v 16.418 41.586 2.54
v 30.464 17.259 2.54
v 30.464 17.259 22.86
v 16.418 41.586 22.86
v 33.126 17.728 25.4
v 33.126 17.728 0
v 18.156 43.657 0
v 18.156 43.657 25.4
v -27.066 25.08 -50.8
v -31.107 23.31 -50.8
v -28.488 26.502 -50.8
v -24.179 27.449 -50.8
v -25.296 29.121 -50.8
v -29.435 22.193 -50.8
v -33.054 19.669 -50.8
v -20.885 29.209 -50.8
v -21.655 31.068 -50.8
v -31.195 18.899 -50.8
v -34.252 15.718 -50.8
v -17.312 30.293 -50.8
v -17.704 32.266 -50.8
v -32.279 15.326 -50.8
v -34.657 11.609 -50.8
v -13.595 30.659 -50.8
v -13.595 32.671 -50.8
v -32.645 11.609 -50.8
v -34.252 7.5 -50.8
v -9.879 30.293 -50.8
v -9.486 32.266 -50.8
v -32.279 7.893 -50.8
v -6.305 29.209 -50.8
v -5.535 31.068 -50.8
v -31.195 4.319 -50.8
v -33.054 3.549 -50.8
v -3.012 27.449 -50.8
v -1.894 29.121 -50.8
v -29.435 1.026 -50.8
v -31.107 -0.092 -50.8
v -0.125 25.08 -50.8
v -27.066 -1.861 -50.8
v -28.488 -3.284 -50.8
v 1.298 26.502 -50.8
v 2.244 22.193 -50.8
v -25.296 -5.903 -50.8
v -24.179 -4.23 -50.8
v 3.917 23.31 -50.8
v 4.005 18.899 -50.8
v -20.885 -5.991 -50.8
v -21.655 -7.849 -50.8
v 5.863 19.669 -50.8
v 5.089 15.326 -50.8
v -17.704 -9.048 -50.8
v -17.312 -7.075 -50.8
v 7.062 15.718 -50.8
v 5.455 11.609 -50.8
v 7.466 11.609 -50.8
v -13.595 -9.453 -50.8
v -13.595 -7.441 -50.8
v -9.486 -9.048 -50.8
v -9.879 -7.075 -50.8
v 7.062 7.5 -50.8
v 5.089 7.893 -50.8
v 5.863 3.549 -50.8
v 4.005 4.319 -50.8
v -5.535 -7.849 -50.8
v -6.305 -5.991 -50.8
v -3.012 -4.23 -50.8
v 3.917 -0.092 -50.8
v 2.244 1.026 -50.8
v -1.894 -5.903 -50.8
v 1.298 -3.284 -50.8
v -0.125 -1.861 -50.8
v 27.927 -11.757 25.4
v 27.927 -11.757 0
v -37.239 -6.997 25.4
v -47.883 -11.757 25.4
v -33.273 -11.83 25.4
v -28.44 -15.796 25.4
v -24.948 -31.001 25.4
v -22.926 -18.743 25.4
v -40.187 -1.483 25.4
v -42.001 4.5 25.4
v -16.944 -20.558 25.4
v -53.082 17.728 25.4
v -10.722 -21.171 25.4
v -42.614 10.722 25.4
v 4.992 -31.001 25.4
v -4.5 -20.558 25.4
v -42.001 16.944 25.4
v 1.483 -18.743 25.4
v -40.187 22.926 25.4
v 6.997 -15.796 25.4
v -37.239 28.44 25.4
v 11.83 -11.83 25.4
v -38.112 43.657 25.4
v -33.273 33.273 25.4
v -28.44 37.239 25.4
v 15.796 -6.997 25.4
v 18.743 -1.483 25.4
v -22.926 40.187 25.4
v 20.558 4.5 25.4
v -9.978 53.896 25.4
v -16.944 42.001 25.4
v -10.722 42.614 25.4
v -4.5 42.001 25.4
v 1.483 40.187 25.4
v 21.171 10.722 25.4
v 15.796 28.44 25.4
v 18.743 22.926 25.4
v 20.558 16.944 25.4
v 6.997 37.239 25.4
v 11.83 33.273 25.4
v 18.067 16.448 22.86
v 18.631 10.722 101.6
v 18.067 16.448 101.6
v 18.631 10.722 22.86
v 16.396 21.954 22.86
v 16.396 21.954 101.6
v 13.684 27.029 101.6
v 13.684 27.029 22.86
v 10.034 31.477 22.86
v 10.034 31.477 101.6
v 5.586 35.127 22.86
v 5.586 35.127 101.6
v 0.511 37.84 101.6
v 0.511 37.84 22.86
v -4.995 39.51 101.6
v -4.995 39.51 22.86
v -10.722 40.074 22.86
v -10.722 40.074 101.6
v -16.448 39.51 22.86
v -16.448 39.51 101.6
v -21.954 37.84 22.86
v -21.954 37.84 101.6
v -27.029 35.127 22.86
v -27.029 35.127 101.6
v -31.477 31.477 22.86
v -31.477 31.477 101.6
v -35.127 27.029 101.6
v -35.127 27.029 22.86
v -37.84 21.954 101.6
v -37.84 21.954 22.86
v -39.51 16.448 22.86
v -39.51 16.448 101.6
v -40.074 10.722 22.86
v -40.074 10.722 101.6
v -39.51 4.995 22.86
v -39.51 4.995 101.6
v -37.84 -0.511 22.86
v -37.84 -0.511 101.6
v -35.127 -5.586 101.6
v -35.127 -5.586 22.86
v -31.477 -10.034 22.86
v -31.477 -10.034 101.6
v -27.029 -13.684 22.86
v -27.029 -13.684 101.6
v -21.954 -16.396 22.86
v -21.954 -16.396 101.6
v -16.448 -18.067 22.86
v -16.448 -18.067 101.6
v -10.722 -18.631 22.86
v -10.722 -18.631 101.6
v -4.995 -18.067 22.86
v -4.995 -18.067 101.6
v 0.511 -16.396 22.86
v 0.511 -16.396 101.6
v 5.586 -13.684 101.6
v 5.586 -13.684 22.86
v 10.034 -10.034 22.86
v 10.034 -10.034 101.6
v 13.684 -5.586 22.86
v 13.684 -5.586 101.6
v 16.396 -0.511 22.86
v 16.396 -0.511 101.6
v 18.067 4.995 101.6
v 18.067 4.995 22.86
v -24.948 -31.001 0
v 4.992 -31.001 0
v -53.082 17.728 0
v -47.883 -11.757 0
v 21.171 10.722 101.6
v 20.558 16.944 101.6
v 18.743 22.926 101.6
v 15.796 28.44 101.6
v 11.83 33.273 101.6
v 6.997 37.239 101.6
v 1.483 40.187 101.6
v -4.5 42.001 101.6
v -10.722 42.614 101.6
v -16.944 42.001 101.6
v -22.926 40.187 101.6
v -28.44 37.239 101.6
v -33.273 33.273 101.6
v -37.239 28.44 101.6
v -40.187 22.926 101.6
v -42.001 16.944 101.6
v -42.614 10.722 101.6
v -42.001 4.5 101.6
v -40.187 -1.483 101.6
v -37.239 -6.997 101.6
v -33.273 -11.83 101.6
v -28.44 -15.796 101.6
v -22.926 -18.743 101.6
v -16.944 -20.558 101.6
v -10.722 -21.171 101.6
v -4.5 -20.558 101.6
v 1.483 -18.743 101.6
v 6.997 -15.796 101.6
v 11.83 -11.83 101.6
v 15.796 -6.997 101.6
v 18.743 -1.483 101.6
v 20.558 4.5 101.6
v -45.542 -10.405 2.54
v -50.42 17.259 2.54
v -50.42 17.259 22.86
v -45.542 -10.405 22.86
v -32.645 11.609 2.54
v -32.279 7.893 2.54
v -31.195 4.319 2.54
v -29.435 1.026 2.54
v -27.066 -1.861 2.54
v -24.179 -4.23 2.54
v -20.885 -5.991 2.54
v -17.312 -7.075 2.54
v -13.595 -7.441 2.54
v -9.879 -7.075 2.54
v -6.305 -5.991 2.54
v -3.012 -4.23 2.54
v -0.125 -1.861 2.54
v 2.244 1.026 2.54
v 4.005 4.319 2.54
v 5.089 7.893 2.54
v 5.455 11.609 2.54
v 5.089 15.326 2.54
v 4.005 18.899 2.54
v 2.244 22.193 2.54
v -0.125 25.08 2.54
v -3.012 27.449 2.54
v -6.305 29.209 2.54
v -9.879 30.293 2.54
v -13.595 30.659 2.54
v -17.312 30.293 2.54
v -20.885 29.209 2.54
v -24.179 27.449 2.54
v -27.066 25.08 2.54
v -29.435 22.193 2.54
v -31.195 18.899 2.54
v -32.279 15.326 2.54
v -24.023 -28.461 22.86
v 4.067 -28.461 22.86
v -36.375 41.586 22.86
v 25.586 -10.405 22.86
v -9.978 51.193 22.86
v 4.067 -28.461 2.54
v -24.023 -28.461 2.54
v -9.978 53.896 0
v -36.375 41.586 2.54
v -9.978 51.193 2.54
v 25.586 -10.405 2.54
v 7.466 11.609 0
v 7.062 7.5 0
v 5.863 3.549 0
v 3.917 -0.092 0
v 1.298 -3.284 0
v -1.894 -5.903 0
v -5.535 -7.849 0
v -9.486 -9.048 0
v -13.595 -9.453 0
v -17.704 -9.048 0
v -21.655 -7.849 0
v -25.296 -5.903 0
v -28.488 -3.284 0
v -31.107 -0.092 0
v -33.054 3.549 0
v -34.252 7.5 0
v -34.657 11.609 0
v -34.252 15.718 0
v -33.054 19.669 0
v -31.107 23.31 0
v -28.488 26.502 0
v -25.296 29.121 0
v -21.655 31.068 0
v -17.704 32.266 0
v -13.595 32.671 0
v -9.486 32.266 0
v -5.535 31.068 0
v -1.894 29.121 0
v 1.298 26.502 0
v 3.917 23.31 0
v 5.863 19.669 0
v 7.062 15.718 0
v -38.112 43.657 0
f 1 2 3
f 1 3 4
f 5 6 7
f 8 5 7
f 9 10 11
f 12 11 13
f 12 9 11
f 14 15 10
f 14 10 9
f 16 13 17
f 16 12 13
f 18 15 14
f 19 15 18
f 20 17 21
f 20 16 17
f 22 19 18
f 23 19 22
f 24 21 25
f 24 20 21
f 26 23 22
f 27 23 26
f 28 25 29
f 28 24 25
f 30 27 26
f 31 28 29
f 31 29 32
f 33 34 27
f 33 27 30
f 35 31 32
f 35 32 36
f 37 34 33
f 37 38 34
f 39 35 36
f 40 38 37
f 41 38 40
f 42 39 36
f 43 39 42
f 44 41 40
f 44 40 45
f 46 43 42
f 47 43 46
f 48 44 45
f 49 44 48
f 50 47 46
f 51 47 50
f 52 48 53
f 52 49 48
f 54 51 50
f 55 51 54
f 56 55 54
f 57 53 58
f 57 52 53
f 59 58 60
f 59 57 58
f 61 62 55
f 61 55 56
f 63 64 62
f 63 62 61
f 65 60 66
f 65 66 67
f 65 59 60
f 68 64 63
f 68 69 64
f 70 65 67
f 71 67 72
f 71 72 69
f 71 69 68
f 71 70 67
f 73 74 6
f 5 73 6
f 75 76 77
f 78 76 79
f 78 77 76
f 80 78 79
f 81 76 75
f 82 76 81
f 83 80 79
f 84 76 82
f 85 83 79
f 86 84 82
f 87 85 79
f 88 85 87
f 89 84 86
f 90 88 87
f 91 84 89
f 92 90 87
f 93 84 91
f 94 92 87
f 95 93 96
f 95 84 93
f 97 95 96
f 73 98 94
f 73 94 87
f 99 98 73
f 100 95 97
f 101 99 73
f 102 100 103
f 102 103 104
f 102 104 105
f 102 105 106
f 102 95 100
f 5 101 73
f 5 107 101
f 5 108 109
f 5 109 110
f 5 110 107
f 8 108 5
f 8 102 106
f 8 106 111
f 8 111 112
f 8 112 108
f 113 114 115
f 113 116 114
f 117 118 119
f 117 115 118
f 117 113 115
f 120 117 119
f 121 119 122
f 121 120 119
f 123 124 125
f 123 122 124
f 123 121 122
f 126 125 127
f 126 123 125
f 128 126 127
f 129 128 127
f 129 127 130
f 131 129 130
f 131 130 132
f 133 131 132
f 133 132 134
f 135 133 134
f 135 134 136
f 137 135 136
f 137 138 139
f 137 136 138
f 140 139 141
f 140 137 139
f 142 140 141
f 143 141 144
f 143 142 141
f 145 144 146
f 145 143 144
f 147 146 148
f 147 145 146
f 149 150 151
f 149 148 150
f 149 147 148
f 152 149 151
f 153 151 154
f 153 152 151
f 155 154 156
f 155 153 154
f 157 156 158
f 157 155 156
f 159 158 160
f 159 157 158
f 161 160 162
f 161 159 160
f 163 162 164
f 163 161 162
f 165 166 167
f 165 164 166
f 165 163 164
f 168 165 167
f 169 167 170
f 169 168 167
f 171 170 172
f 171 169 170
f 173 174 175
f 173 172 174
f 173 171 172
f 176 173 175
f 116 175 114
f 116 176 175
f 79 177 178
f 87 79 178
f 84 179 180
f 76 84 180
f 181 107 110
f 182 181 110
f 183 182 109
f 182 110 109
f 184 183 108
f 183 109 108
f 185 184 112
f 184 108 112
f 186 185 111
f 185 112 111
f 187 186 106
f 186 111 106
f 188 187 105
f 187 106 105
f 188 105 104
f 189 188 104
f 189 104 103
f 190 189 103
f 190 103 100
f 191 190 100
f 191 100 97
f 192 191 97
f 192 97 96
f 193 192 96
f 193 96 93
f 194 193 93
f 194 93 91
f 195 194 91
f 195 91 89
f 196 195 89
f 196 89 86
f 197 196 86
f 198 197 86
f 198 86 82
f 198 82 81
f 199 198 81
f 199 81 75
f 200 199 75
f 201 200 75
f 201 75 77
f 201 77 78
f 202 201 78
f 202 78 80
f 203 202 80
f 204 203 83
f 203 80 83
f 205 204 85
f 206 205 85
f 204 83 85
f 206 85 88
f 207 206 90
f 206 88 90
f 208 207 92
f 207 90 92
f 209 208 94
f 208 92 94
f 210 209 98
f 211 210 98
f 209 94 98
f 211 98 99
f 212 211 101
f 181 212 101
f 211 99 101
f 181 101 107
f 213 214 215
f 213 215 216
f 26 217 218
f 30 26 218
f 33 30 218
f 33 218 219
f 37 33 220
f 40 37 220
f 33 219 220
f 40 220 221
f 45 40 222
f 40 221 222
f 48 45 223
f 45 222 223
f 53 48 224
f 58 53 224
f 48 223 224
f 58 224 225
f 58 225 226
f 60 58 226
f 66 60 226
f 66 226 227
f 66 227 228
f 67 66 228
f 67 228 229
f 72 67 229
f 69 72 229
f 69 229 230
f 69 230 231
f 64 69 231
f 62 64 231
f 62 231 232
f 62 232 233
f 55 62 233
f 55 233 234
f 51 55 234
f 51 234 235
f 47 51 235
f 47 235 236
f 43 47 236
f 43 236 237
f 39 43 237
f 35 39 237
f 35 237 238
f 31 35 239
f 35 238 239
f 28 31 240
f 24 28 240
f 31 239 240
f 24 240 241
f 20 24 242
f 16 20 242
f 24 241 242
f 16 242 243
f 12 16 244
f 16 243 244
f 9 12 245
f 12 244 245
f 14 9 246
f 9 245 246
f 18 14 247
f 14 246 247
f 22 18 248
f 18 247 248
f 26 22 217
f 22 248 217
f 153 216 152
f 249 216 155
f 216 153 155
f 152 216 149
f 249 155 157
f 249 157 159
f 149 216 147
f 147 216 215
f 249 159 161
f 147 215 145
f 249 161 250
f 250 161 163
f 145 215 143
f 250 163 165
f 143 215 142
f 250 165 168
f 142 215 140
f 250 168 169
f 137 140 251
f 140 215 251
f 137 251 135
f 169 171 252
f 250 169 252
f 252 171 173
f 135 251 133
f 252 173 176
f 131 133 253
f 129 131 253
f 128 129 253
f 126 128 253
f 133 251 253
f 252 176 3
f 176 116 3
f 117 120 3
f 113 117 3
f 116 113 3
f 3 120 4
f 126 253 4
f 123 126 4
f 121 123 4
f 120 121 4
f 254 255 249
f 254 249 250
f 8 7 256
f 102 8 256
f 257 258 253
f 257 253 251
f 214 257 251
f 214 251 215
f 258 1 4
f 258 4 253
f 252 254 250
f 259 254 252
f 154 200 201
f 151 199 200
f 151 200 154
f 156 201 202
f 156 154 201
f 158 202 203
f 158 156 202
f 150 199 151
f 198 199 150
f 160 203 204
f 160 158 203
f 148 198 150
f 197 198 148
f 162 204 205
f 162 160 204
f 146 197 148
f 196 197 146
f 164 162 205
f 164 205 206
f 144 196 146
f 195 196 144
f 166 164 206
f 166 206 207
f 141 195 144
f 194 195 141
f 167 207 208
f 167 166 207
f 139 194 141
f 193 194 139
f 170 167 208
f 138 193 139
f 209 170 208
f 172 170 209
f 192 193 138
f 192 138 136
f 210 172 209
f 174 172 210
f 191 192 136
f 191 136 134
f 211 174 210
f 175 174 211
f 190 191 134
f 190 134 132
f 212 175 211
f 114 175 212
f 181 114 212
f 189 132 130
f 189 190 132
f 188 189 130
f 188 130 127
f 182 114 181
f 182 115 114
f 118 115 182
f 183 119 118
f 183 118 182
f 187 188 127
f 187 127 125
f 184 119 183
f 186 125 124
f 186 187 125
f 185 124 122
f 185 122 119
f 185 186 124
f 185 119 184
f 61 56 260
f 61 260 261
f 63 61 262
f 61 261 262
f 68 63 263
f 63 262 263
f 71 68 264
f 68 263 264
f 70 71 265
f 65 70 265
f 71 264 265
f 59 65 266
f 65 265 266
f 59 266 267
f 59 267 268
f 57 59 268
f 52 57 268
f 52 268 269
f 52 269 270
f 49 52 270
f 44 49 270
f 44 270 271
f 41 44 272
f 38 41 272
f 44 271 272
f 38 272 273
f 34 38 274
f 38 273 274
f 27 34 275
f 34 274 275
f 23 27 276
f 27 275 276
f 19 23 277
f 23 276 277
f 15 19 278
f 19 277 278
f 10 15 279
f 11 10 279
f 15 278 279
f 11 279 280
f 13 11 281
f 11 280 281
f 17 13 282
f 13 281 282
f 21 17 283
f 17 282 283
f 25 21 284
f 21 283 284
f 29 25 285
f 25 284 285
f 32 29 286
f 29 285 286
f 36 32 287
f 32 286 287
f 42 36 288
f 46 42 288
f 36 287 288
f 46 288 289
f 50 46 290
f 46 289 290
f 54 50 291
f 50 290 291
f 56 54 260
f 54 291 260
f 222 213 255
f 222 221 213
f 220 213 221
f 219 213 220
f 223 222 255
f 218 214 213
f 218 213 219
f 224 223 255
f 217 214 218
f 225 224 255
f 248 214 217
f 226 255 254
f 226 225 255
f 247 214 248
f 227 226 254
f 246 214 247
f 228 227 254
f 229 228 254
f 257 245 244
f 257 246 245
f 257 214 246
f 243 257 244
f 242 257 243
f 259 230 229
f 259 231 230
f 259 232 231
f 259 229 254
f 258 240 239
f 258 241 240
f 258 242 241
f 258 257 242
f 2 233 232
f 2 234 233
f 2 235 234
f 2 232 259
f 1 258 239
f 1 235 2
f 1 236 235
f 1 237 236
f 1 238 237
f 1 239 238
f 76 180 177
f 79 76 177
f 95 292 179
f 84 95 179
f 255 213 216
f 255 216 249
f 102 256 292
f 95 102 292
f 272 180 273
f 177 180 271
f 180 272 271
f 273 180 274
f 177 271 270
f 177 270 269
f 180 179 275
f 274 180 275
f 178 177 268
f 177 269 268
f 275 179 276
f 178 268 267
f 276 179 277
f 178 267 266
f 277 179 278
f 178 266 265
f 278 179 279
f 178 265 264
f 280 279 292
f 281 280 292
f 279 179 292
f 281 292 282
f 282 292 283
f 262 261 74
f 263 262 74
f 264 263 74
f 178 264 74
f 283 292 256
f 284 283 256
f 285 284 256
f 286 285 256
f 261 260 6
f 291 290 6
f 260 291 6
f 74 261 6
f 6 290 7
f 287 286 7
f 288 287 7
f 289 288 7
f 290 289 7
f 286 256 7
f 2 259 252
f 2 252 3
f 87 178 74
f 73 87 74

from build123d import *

# Parameters (mm, degrees)
F0_R     = 31.8925306259
F1_DEPTH = 101.6
F3_DEPTH = 25.4
F4_T     = -2.54
F5_R     = 21.061659134
F6_DEPTH = 50.8
F8_D     = 38.1


with BuildPart() as f1:
    # F0 (on Top) → F1 (new body)
    with BuildSketch(Plane.XY):
        with Locations((-10.7217477635, 10.721755214)):
            Circle(F0_R)
    extrude(amount=F1_DEPTH)

    # F2 (on Top) → F3 (join)
    with BuildSketch(Plane.XY):
        Polygon((-24.9478270625, -31.0014169663), (4.9917486821, -31.0014169663), (27.9267943106, -11.7566286384), (33.1257470788, 17.7280976768), (18.1559592065, 43.6565308501), (-9.9780391902, 53.8964688374), (-38.1120375868, 43.6565308501), (-53.0818254591, 17.7280976768), (-47.882872691, -11.7566286384), align=None)
    extrude(amount=F3_DEPTH)

    # F4
    f4_openings = [f1.faces().sort_by_distance(p)[0] for p in [
        (-10.721748, 10.721755, 101.6),
    ]]
    offset(amount=F4_T, openings=f4_openings, kind=Kind.INTERSECTION)

    # F5 (on face) → F6 (join)
    with BuildSketch(Plane(origin=(0, 0, 0), x_dir=(1, 0, 0), z_dir=(0, 0, -1))):
        with Locations((-13.595267199, -11.6091426462)):
            Circle(F5_R)
    extrude(amount=F6_DEPTH)

    # F8 (through all)
    with Locations(Plane(origin=(0, 0, -50.8), x_dir=(1, 0, 0), z_dir=(0, 0, -1))):
        with Locations((-13.595267199, -11.6091426462)):
            Hole(F8_D / 2)


solid = f1.part
